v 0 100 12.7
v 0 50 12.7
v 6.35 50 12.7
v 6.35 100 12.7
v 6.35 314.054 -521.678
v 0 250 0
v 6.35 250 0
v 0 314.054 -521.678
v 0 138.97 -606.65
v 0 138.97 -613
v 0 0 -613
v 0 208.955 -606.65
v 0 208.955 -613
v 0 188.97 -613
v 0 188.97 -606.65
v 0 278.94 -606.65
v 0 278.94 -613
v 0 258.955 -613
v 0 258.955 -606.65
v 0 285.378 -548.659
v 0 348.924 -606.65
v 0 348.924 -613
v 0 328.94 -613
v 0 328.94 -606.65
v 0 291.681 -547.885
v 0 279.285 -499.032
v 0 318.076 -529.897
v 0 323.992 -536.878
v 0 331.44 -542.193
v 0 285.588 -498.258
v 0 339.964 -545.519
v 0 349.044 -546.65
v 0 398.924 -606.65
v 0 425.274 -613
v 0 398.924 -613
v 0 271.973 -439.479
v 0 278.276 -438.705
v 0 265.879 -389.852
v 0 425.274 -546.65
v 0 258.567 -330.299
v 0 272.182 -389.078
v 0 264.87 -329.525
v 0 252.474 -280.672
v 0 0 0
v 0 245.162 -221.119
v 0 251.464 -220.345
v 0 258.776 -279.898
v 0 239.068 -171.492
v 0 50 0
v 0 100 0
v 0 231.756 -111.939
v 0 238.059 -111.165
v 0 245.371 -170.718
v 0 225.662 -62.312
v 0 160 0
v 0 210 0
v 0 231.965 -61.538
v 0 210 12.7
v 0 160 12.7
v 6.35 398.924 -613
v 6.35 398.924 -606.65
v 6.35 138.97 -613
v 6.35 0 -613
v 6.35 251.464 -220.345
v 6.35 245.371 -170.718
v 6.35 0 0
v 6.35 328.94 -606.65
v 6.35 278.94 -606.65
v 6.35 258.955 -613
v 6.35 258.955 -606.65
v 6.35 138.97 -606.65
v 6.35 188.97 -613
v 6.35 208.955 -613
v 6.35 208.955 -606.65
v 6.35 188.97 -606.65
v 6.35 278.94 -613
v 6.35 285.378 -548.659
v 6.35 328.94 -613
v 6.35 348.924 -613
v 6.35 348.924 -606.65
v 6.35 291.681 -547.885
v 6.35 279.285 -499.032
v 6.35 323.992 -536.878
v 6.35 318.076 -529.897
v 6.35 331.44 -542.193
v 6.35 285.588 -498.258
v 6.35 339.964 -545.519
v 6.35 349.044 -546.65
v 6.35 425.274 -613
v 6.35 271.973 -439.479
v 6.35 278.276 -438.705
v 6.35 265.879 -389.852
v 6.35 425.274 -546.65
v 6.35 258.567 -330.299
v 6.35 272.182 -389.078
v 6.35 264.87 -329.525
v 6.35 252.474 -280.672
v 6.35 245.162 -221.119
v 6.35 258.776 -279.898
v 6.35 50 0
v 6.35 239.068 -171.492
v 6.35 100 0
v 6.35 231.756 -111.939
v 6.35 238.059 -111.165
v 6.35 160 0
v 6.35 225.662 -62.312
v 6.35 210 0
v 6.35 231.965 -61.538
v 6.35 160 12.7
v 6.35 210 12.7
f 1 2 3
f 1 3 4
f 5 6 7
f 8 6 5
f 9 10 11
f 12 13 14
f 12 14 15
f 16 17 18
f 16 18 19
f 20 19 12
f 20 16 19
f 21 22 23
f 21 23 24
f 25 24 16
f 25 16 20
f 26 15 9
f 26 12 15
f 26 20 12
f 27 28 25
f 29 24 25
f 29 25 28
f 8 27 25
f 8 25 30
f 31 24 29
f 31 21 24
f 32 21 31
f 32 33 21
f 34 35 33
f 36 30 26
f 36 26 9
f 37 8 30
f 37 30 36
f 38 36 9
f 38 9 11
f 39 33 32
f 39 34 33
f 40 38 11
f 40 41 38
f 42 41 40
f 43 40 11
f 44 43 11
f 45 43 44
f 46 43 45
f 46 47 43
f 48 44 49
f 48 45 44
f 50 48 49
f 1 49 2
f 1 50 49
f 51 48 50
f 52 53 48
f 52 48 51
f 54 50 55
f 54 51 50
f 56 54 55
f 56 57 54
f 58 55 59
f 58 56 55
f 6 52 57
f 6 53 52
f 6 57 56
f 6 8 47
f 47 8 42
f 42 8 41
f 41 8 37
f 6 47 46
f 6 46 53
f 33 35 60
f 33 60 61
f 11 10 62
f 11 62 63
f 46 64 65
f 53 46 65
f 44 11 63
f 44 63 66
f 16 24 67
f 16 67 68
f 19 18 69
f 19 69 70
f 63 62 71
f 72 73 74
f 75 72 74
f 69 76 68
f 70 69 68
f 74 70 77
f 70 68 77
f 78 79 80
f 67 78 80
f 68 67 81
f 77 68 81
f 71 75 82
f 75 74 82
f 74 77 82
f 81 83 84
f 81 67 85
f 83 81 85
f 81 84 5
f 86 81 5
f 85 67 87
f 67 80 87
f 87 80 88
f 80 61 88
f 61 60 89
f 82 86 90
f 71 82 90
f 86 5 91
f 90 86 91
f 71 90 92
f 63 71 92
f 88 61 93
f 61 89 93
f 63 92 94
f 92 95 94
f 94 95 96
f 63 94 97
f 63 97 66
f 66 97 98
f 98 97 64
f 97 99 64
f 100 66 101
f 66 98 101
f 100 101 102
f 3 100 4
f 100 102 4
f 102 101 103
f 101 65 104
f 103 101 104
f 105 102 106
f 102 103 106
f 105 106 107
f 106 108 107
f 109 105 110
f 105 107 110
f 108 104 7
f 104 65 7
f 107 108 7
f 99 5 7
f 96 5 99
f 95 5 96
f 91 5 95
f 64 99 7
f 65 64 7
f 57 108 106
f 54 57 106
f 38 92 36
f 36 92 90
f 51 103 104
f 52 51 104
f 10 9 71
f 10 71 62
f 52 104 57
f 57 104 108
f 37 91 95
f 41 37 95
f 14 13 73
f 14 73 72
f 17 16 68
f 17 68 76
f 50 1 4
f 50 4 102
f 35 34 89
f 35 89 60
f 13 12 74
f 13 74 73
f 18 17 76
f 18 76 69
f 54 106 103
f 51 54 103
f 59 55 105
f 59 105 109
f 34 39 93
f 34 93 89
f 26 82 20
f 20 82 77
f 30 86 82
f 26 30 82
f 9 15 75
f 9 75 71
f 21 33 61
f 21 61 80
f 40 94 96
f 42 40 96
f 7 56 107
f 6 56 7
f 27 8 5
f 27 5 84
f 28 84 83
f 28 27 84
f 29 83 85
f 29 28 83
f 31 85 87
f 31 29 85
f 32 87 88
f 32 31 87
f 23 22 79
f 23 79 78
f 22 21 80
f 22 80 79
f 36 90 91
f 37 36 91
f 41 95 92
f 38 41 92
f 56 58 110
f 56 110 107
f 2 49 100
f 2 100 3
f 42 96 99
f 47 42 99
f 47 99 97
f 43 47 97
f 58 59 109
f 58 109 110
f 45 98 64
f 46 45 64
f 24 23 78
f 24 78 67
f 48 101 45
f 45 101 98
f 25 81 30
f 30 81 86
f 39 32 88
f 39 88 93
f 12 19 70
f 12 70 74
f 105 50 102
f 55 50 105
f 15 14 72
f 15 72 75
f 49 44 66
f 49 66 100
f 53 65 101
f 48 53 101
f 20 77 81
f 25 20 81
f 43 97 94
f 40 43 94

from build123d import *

# Parameters (mm, degrees)
BOSS_EXTRUDE1_DEPTH = 6.35
CUT_EXTRUDE1_DEPTH  = 6.35


with BuildPart() as part:
    # Sketch1 → Boss-Extrude1 (new body)
    with BuildSketch(Plane(origin=(0, 0, 0), x_dir=(0, 0, -1), z_dir=(1, 0, 0))):
        with BuildLine():
            Line((0, 250), (521.678128656, 314.05401996))
            ThreePointArc((521.678128656, 314.05401996), (539.766779046, 327.550652044), (546.65, 349.044363214))
            Line((546.65, 349.044363214), (546.65, 425.274363214))
            Line((546.65, 425.274363214), (613, 425.274363214))
            Line((613, 425.274363214), (613, 398.924363214))
            Line((613, 398.924363214), (606.65, 398.924363214))
            Line((606.65, 398.924363214), (606.65, 348.924363214))
            Line((606.65, 348.924363214), (613, 348.924363214))
            Line((613, 348.924363214), (613, 328.939575476))
            Line((613, 328.939575476), (606.65, 328.939575476))
            Line((606.65, 328.939575476), (606.65, 278.939575476))
            Line((606.65, 278.939575476), (613, 278.939575476))
            Line((613, 278.939575476), (613, 258.954787738))
            Line((613, 258.954787738), (606.65, 258.954787738))
            Line((606.65, 258.954787738), (606.65, 208.954787738))
            Line((606.65, 208.954787738), (613, 208.954787738))
            Line((613, 208.954787738), (613, 188.97))
            Line((613, 188.97), (606.65, 188.97))
            Line((606.65, 188.97), (606.65, 138.97))
            Line((606.65, 138.97), (613, 138.97))
            Line((613, 138.97), (613, 0))
            Line((613, 0), (0, 0))
            Line((0, 0), (0, 50))
            Line((0, 50), (-12.7, 50))
            Line((-12.7, 50), (-12.7, 100))
            Line((-12.7, 100), (0, 100))
            Line((0, 100), (0, 160))
            Line((0, 160), (-12.7, 160))
            Line((-12.7, 160), (-12.7, 210))
            Line((-12.7, 210), (0, 210))
            Line((0, 210), (0, 250))
        make_face()
    extrude(amount=BOSS_EXTRUDE1_DEPTH)

    # Sketch2 → Cut-Extrude1 (cut)
    with BuildSketch(Plane(origin=(6.35, 0, 0), x_dir=(0, 0, -1), z_dir=(1, 0, 0))):
        Polygon((61.537861402, 231.965149724), (62.311731732, 225.662481662), (111.939039314, 231.755948832), (111.165168984, 238.058616895), align=None)
        Polygon((220.345245664, 251.464244669), (170.717938082, 245.370777499), (171.491808413, 239.068109436), (221.119115995, 245.161576606), align=None)
        Polygon((329.525322345, 264.869872444), (279.898014763, 258.776405274), (280.671885093, 252.473737211), (330.299192676, 258.567204381), align=None)
        Polygon((438.705399025, 278.275500218), (389.078091443, 272.182033048), (389.851961774, 265.879364985), (439.479269356, 271.972832155), align=None)
        Polygon((547.885475706, 291.681127993), (498.258168124, 285.587660823), (499.032038455, 279.28499276), (548.659346037, 285.37845993), align=None)
    extrude(amount=-CUT_EXTRUDE1_DEPTH, mode=Mode.SUBTRACT)


solid = part.part
